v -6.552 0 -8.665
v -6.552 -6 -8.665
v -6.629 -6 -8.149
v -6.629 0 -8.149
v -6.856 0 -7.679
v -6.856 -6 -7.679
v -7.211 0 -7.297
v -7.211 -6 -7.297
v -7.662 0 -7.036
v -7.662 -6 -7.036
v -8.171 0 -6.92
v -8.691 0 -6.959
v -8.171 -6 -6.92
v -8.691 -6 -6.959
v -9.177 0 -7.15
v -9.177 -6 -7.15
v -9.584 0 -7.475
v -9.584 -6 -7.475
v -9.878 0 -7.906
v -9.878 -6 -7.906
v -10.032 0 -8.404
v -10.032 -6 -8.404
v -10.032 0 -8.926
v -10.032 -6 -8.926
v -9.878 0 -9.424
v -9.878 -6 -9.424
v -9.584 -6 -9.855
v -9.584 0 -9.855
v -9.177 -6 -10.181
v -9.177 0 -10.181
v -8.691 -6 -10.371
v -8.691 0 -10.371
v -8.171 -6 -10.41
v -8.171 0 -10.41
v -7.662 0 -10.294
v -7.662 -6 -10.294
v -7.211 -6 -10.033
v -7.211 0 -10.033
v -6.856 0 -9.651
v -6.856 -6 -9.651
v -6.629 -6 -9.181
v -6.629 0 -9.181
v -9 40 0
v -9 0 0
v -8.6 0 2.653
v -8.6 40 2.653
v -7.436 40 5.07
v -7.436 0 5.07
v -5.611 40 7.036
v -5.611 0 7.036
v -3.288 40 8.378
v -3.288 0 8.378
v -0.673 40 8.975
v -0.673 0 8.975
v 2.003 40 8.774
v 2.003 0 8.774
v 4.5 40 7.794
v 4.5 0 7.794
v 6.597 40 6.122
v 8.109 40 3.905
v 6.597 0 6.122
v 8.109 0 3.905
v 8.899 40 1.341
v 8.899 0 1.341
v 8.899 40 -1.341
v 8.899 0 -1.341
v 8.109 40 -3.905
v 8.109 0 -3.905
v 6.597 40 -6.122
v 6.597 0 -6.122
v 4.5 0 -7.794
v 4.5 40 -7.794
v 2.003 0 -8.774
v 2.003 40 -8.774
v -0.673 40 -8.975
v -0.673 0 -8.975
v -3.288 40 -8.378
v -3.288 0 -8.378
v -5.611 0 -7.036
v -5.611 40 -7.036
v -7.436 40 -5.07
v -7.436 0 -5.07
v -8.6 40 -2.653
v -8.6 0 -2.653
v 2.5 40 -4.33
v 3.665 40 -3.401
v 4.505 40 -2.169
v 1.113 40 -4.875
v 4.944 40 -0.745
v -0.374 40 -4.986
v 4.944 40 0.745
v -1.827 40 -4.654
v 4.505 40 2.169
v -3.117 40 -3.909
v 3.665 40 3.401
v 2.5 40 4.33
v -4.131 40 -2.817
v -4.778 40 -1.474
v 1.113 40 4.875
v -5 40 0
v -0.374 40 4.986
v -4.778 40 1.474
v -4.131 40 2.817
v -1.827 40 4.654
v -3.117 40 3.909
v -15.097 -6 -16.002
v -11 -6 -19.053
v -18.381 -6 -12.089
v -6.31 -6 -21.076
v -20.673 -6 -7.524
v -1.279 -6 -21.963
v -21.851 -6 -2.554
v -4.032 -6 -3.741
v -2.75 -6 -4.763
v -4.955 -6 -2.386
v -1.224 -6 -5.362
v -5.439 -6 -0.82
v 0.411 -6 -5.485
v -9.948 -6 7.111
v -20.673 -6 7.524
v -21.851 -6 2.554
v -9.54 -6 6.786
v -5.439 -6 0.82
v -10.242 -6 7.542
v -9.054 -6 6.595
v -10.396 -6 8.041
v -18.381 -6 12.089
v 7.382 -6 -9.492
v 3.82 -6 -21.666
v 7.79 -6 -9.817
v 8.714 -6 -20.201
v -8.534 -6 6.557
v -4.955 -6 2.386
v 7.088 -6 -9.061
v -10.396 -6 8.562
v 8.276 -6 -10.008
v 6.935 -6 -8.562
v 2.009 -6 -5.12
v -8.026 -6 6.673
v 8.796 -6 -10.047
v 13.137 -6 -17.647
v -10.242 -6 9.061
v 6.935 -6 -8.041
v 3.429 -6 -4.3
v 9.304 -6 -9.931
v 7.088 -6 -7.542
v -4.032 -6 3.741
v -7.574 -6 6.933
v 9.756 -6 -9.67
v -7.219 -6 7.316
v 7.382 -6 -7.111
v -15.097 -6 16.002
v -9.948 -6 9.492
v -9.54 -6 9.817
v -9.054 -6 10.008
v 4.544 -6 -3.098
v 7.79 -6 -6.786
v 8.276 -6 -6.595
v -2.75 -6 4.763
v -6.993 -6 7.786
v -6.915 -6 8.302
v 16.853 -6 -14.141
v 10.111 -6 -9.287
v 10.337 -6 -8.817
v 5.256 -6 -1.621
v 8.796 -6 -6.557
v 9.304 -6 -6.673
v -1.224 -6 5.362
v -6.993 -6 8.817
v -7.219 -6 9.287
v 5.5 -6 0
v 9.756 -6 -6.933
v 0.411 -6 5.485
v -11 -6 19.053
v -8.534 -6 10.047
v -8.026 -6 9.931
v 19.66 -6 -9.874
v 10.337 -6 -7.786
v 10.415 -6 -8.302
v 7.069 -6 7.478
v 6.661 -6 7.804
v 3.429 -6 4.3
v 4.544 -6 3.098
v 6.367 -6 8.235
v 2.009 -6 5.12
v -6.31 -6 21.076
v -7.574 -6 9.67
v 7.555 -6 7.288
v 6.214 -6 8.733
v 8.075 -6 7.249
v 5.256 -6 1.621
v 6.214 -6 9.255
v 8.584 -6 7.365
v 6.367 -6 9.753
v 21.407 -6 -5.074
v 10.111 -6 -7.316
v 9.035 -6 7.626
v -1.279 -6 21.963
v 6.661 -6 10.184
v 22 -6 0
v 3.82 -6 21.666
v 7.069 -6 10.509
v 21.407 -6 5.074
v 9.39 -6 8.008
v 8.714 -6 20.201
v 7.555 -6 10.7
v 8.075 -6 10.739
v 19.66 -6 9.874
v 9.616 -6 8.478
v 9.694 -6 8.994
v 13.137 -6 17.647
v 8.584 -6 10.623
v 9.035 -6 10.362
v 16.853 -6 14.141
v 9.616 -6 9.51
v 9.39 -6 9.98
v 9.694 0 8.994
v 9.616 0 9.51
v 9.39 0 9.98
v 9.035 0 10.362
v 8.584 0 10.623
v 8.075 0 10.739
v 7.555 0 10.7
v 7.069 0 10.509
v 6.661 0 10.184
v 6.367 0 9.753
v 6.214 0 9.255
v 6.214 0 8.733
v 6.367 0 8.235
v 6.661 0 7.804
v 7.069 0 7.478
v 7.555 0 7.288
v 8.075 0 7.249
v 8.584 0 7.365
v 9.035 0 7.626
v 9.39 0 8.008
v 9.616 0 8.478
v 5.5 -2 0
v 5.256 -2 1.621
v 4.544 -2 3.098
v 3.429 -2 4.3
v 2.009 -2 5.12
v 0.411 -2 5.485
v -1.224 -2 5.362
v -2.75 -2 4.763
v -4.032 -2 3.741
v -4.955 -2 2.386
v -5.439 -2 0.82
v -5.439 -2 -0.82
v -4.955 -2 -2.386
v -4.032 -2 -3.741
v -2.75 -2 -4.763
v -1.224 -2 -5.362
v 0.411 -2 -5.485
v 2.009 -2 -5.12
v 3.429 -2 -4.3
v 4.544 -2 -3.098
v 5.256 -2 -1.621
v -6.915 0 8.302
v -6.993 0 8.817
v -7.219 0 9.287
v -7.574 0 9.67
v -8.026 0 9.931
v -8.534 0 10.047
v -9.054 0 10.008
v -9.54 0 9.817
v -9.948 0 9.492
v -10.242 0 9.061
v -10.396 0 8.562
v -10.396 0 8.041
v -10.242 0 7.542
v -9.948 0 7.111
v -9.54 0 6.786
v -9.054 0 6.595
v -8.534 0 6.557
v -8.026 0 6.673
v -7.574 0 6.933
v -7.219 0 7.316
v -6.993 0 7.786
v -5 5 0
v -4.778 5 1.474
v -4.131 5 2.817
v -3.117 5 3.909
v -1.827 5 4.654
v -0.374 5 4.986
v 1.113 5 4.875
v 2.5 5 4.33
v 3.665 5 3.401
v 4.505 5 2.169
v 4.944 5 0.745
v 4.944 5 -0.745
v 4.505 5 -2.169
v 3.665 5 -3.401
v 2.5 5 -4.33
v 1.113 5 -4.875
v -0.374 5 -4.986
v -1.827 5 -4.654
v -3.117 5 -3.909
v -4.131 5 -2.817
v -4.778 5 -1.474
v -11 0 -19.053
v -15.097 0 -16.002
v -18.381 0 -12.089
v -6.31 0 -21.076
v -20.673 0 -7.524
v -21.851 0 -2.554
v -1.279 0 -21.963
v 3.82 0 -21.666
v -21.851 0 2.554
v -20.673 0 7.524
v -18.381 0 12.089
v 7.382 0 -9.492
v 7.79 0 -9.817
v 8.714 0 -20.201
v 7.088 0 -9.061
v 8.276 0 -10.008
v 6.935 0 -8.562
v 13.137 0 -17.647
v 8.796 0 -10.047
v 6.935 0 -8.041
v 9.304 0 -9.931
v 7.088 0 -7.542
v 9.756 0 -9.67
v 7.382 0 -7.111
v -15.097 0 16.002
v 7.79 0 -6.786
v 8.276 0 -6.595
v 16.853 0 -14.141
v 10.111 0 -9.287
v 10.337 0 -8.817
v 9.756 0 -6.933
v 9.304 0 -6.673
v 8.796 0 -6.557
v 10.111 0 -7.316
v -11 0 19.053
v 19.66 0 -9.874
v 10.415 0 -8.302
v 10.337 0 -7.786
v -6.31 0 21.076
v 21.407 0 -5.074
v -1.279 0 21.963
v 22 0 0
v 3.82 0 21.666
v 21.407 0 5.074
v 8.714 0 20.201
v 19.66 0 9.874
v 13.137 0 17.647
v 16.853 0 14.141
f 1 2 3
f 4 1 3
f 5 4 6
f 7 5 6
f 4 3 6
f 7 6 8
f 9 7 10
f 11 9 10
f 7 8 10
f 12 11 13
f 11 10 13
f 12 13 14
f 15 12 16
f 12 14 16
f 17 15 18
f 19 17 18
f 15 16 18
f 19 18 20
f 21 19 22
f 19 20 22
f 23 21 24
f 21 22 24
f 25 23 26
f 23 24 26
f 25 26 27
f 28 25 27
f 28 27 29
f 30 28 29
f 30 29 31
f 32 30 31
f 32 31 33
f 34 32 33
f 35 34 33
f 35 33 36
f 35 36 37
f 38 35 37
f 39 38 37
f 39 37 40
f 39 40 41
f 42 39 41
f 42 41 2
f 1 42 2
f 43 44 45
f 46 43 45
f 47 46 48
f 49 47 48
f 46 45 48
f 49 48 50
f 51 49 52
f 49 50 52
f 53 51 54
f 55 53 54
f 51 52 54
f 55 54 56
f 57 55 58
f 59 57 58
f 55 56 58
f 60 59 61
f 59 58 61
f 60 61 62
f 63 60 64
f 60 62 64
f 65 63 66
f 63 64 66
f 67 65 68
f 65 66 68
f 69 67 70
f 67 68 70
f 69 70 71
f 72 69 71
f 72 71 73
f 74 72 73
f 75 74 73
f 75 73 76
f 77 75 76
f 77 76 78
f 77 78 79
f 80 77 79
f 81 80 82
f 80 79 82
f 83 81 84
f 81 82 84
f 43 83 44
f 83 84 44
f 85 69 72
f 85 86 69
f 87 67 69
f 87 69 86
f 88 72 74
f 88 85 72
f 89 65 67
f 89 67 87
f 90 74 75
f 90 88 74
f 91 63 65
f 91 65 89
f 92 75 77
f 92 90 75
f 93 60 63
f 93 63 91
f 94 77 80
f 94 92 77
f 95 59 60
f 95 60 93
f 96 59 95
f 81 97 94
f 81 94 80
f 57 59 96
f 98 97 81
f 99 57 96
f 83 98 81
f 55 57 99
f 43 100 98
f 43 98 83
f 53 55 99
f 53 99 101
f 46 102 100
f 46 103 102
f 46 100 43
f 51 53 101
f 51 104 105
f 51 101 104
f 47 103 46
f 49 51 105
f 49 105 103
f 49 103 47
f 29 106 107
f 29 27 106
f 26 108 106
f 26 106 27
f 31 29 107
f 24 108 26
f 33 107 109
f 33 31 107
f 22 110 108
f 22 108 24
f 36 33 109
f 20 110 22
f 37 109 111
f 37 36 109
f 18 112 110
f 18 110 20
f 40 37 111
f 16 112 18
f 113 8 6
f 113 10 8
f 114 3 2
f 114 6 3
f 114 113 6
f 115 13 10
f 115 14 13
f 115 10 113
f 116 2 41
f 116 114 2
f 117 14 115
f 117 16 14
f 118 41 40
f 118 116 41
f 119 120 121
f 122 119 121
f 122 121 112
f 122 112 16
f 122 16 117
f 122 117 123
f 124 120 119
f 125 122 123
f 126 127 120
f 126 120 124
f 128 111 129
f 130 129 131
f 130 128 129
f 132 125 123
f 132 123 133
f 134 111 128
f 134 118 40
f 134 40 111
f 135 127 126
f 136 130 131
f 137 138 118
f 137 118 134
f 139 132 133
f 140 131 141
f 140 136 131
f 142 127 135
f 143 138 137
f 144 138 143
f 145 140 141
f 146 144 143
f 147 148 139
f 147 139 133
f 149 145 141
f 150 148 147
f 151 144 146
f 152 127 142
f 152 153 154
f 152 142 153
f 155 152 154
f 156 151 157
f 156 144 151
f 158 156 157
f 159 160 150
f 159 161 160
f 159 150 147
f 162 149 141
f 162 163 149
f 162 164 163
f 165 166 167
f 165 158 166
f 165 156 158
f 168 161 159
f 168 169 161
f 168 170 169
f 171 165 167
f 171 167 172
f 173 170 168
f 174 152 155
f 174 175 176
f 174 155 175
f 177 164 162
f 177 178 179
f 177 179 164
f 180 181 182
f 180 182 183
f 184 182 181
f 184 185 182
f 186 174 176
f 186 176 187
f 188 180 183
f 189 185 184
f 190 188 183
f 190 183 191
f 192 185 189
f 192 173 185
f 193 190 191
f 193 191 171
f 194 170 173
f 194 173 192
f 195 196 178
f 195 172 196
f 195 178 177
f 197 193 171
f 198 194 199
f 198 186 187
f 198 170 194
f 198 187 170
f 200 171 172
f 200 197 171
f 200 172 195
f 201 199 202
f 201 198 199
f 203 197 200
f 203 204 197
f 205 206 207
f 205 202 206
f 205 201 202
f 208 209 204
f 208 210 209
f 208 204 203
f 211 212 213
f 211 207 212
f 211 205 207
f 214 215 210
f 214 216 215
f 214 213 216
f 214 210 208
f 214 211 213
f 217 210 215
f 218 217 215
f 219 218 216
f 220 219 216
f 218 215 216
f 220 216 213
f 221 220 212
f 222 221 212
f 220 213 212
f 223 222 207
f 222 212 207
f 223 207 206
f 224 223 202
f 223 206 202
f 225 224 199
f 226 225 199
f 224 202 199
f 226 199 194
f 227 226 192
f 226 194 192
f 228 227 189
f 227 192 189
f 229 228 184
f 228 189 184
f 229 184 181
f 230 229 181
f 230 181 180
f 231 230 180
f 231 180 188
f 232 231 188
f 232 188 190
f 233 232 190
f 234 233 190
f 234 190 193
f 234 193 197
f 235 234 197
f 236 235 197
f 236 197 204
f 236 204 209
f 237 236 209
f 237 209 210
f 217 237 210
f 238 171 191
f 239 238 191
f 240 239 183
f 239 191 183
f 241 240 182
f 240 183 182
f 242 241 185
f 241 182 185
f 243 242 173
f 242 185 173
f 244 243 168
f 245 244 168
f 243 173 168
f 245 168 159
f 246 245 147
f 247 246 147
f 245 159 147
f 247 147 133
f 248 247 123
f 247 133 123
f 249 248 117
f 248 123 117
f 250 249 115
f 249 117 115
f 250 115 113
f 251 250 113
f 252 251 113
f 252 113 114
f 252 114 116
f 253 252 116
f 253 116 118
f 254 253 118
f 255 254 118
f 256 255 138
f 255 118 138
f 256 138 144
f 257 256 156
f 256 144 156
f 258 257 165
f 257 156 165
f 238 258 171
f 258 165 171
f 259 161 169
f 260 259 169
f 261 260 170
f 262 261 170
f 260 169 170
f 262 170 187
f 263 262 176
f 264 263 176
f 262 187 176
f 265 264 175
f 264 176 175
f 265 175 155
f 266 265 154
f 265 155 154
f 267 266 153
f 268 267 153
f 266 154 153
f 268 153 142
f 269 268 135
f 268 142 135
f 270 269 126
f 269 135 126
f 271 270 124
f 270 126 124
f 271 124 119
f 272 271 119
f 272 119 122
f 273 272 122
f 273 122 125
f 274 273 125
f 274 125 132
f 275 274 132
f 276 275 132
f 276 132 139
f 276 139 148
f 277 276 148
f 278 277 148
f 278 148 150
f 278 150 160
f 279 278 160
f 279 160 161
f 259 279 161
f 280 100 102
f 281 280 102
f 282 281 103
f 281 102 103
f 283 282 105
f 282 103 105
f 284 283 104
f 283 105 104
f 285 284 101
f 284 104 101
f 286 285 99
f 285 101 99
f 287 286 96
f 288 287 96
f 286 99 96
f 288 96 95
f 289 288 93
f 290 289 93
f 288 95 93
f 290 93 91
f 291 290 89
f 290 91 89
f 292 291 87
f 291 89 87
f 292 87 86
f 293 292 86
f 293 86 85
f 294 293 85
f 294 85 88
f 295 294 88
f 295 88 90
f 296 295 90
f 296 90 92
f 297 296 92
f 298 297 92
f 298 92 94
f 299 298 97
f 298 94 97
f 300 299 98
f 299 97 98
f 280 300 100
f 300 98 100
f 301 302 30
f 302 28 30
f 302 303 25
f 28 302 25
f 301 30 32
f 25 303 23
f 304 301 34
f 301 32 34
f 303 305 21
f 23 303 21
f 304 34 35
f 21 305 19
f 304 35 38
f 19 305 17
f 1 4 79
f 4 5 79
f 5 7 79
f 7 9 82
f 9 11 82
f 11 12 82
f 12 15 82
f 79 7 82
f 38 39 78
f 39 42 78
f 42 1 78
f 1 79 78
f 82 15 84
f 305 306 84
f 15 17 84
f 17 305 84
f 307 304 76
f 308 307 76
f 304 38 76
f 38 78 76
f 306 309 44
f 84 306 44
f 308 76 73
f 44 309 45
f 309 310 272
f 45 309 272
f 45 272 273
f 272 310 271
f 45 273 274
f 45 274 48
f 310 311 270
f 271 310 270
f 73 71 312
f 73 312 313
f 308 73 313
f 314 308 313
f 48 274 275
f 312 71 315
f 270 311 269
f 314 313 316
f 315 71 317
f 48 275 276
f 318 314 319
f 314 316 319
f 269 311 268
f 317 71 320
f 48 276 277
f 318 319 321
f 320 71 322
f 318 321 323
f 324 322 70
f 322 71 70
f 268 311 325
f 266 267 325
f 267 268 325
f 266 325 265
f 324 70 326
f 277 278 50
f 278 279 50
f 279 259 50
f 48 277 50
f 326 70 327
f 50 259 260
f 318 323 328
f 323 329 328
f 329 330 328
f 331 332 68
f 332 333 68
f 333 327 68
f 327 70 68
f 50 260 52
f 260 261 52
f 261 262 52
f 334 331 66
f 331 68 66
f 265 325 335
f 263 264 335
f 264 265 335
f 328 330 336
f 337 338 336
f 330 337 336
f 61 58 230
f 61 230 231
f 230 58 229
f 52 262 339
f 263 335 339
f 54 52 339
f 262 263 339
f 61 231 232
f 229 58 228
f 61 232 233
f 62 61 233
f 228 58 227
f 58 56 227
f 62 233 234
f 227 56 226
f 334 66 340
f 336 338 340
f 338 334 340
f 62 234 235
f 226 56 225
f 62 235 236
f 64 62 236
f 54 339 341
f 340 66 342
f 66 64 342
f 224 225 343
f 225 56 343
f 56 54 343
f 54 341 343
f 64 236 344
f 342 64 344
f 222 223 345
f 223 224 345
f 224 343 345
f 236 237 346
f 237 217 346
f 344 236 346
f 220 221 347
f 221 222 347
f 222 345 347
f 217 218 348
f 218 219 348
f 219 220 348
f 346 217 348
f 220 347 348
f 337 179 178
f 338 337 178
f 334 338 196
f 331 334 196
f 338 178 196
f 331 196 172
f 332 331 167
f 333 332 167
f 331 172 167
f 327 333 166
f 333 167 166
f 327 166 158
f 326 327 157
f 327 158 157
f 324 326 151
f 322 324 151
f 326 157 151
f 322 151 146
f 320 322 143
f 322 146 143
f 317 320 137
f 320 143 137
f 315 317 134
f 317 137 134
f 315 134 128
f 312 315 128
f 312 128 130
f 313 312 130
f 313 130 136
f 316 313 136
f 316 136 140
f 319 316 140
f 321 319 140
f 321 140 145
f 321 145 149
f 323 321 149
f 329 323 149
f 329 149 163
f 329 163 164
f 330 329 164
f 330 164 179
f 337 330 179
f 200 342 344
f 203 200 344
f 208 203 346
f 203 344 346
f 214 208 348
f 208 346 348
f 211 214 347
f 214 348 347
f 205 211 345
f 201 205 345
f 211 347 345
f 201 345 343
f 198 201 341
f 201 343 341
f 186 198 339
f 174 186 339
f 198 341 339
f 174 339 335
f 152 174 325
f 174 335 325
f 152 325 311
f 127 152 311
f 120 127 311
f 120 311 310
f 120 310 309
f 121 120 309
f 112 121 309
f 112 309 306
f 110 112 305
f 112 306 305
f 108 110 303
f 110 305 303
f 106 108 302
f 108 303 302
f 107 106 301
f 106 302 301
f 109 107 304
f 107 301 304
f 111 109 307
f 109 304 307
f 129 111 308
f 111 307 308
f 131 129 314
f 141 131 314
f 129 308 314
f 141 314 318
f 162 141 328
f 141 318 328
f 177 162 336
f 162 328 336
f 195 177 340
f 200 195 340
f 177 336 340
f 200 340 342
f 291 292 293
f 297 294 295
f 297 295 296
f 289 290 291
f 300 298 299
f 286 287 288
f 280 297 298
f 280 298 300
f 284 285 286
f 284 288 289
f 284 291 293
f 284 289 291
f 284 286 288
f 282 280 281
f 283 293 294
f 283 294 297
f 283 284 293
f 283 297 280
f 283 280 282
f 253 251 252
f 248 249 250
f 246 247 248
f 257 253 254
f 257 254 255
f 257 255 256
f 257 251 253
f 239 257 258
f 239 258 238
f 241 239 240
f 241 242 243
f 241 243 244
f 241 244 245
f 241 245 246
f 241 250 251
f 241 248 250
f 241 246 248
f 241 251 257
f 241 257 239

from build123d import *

# Parameters (mm, degrees)
F0_R     = 22
F1_DEPTH = 6
F2_R     = 1.75
F3_DEPTH = 6.001
F4_R     = 5.5
F5_DEPTH = 4
F6_R     = 9
F7_DEPTH = 40
F8_R     = 5
F9_DEPTH = 35


with BuildPart() as f1:
    # F0 (on Front) → F1 (new body)
    with BuildSketch(Plane.XZ):
        Circle(F0_R)
    extrude(amount=F1_DEPTH)

    # F2 (on face) → F3 (cut, through all)
    with BuildSketch(Plane.XZ.offset(6)):
        with Locations((-8.301622, -8.665049)):
            Circle(F2_R)
        with Locations((8.665049, -8.301622)):
            Circle(F2_R)
        with Locations((-8.665049, 8.301622)):
            Circle(F2_R)
        with Locations((7.944154, 8.99391)):
            Circle(F2_R)
    extrude(amount=-F3_DEPTH, mode=Mode.SUBTRACT)

    # F4 (on face) → F5 (cut)
    with BuildSketch(Plane.XZ.offset(6)):
        Circle(F4_R)
    extrude(amount=-F5_DEPTH, mode=Mode.SUBTRACT)

    # F6 (on face) → F7 (join)
    with BuildSketch(Plane(origin=(0, 0, 0), x_dir=(-1, 0, 0), z_dir=(0, 1, 0))):
        Circle(F6_R)
    extrude(amount=F7_DEPTH)

    # F8 (on face) → F9 (cut)
    with BuildSketch(Plane(origin=(0, 40, 0), x_dir=(-1, 0, 0), z_dir=(0, 1, 0))):
        Circle(F8_R)
    extrude(amount=-F9_DEPTH, mode=Mode.SUBTRACT)


solid = f1.part
